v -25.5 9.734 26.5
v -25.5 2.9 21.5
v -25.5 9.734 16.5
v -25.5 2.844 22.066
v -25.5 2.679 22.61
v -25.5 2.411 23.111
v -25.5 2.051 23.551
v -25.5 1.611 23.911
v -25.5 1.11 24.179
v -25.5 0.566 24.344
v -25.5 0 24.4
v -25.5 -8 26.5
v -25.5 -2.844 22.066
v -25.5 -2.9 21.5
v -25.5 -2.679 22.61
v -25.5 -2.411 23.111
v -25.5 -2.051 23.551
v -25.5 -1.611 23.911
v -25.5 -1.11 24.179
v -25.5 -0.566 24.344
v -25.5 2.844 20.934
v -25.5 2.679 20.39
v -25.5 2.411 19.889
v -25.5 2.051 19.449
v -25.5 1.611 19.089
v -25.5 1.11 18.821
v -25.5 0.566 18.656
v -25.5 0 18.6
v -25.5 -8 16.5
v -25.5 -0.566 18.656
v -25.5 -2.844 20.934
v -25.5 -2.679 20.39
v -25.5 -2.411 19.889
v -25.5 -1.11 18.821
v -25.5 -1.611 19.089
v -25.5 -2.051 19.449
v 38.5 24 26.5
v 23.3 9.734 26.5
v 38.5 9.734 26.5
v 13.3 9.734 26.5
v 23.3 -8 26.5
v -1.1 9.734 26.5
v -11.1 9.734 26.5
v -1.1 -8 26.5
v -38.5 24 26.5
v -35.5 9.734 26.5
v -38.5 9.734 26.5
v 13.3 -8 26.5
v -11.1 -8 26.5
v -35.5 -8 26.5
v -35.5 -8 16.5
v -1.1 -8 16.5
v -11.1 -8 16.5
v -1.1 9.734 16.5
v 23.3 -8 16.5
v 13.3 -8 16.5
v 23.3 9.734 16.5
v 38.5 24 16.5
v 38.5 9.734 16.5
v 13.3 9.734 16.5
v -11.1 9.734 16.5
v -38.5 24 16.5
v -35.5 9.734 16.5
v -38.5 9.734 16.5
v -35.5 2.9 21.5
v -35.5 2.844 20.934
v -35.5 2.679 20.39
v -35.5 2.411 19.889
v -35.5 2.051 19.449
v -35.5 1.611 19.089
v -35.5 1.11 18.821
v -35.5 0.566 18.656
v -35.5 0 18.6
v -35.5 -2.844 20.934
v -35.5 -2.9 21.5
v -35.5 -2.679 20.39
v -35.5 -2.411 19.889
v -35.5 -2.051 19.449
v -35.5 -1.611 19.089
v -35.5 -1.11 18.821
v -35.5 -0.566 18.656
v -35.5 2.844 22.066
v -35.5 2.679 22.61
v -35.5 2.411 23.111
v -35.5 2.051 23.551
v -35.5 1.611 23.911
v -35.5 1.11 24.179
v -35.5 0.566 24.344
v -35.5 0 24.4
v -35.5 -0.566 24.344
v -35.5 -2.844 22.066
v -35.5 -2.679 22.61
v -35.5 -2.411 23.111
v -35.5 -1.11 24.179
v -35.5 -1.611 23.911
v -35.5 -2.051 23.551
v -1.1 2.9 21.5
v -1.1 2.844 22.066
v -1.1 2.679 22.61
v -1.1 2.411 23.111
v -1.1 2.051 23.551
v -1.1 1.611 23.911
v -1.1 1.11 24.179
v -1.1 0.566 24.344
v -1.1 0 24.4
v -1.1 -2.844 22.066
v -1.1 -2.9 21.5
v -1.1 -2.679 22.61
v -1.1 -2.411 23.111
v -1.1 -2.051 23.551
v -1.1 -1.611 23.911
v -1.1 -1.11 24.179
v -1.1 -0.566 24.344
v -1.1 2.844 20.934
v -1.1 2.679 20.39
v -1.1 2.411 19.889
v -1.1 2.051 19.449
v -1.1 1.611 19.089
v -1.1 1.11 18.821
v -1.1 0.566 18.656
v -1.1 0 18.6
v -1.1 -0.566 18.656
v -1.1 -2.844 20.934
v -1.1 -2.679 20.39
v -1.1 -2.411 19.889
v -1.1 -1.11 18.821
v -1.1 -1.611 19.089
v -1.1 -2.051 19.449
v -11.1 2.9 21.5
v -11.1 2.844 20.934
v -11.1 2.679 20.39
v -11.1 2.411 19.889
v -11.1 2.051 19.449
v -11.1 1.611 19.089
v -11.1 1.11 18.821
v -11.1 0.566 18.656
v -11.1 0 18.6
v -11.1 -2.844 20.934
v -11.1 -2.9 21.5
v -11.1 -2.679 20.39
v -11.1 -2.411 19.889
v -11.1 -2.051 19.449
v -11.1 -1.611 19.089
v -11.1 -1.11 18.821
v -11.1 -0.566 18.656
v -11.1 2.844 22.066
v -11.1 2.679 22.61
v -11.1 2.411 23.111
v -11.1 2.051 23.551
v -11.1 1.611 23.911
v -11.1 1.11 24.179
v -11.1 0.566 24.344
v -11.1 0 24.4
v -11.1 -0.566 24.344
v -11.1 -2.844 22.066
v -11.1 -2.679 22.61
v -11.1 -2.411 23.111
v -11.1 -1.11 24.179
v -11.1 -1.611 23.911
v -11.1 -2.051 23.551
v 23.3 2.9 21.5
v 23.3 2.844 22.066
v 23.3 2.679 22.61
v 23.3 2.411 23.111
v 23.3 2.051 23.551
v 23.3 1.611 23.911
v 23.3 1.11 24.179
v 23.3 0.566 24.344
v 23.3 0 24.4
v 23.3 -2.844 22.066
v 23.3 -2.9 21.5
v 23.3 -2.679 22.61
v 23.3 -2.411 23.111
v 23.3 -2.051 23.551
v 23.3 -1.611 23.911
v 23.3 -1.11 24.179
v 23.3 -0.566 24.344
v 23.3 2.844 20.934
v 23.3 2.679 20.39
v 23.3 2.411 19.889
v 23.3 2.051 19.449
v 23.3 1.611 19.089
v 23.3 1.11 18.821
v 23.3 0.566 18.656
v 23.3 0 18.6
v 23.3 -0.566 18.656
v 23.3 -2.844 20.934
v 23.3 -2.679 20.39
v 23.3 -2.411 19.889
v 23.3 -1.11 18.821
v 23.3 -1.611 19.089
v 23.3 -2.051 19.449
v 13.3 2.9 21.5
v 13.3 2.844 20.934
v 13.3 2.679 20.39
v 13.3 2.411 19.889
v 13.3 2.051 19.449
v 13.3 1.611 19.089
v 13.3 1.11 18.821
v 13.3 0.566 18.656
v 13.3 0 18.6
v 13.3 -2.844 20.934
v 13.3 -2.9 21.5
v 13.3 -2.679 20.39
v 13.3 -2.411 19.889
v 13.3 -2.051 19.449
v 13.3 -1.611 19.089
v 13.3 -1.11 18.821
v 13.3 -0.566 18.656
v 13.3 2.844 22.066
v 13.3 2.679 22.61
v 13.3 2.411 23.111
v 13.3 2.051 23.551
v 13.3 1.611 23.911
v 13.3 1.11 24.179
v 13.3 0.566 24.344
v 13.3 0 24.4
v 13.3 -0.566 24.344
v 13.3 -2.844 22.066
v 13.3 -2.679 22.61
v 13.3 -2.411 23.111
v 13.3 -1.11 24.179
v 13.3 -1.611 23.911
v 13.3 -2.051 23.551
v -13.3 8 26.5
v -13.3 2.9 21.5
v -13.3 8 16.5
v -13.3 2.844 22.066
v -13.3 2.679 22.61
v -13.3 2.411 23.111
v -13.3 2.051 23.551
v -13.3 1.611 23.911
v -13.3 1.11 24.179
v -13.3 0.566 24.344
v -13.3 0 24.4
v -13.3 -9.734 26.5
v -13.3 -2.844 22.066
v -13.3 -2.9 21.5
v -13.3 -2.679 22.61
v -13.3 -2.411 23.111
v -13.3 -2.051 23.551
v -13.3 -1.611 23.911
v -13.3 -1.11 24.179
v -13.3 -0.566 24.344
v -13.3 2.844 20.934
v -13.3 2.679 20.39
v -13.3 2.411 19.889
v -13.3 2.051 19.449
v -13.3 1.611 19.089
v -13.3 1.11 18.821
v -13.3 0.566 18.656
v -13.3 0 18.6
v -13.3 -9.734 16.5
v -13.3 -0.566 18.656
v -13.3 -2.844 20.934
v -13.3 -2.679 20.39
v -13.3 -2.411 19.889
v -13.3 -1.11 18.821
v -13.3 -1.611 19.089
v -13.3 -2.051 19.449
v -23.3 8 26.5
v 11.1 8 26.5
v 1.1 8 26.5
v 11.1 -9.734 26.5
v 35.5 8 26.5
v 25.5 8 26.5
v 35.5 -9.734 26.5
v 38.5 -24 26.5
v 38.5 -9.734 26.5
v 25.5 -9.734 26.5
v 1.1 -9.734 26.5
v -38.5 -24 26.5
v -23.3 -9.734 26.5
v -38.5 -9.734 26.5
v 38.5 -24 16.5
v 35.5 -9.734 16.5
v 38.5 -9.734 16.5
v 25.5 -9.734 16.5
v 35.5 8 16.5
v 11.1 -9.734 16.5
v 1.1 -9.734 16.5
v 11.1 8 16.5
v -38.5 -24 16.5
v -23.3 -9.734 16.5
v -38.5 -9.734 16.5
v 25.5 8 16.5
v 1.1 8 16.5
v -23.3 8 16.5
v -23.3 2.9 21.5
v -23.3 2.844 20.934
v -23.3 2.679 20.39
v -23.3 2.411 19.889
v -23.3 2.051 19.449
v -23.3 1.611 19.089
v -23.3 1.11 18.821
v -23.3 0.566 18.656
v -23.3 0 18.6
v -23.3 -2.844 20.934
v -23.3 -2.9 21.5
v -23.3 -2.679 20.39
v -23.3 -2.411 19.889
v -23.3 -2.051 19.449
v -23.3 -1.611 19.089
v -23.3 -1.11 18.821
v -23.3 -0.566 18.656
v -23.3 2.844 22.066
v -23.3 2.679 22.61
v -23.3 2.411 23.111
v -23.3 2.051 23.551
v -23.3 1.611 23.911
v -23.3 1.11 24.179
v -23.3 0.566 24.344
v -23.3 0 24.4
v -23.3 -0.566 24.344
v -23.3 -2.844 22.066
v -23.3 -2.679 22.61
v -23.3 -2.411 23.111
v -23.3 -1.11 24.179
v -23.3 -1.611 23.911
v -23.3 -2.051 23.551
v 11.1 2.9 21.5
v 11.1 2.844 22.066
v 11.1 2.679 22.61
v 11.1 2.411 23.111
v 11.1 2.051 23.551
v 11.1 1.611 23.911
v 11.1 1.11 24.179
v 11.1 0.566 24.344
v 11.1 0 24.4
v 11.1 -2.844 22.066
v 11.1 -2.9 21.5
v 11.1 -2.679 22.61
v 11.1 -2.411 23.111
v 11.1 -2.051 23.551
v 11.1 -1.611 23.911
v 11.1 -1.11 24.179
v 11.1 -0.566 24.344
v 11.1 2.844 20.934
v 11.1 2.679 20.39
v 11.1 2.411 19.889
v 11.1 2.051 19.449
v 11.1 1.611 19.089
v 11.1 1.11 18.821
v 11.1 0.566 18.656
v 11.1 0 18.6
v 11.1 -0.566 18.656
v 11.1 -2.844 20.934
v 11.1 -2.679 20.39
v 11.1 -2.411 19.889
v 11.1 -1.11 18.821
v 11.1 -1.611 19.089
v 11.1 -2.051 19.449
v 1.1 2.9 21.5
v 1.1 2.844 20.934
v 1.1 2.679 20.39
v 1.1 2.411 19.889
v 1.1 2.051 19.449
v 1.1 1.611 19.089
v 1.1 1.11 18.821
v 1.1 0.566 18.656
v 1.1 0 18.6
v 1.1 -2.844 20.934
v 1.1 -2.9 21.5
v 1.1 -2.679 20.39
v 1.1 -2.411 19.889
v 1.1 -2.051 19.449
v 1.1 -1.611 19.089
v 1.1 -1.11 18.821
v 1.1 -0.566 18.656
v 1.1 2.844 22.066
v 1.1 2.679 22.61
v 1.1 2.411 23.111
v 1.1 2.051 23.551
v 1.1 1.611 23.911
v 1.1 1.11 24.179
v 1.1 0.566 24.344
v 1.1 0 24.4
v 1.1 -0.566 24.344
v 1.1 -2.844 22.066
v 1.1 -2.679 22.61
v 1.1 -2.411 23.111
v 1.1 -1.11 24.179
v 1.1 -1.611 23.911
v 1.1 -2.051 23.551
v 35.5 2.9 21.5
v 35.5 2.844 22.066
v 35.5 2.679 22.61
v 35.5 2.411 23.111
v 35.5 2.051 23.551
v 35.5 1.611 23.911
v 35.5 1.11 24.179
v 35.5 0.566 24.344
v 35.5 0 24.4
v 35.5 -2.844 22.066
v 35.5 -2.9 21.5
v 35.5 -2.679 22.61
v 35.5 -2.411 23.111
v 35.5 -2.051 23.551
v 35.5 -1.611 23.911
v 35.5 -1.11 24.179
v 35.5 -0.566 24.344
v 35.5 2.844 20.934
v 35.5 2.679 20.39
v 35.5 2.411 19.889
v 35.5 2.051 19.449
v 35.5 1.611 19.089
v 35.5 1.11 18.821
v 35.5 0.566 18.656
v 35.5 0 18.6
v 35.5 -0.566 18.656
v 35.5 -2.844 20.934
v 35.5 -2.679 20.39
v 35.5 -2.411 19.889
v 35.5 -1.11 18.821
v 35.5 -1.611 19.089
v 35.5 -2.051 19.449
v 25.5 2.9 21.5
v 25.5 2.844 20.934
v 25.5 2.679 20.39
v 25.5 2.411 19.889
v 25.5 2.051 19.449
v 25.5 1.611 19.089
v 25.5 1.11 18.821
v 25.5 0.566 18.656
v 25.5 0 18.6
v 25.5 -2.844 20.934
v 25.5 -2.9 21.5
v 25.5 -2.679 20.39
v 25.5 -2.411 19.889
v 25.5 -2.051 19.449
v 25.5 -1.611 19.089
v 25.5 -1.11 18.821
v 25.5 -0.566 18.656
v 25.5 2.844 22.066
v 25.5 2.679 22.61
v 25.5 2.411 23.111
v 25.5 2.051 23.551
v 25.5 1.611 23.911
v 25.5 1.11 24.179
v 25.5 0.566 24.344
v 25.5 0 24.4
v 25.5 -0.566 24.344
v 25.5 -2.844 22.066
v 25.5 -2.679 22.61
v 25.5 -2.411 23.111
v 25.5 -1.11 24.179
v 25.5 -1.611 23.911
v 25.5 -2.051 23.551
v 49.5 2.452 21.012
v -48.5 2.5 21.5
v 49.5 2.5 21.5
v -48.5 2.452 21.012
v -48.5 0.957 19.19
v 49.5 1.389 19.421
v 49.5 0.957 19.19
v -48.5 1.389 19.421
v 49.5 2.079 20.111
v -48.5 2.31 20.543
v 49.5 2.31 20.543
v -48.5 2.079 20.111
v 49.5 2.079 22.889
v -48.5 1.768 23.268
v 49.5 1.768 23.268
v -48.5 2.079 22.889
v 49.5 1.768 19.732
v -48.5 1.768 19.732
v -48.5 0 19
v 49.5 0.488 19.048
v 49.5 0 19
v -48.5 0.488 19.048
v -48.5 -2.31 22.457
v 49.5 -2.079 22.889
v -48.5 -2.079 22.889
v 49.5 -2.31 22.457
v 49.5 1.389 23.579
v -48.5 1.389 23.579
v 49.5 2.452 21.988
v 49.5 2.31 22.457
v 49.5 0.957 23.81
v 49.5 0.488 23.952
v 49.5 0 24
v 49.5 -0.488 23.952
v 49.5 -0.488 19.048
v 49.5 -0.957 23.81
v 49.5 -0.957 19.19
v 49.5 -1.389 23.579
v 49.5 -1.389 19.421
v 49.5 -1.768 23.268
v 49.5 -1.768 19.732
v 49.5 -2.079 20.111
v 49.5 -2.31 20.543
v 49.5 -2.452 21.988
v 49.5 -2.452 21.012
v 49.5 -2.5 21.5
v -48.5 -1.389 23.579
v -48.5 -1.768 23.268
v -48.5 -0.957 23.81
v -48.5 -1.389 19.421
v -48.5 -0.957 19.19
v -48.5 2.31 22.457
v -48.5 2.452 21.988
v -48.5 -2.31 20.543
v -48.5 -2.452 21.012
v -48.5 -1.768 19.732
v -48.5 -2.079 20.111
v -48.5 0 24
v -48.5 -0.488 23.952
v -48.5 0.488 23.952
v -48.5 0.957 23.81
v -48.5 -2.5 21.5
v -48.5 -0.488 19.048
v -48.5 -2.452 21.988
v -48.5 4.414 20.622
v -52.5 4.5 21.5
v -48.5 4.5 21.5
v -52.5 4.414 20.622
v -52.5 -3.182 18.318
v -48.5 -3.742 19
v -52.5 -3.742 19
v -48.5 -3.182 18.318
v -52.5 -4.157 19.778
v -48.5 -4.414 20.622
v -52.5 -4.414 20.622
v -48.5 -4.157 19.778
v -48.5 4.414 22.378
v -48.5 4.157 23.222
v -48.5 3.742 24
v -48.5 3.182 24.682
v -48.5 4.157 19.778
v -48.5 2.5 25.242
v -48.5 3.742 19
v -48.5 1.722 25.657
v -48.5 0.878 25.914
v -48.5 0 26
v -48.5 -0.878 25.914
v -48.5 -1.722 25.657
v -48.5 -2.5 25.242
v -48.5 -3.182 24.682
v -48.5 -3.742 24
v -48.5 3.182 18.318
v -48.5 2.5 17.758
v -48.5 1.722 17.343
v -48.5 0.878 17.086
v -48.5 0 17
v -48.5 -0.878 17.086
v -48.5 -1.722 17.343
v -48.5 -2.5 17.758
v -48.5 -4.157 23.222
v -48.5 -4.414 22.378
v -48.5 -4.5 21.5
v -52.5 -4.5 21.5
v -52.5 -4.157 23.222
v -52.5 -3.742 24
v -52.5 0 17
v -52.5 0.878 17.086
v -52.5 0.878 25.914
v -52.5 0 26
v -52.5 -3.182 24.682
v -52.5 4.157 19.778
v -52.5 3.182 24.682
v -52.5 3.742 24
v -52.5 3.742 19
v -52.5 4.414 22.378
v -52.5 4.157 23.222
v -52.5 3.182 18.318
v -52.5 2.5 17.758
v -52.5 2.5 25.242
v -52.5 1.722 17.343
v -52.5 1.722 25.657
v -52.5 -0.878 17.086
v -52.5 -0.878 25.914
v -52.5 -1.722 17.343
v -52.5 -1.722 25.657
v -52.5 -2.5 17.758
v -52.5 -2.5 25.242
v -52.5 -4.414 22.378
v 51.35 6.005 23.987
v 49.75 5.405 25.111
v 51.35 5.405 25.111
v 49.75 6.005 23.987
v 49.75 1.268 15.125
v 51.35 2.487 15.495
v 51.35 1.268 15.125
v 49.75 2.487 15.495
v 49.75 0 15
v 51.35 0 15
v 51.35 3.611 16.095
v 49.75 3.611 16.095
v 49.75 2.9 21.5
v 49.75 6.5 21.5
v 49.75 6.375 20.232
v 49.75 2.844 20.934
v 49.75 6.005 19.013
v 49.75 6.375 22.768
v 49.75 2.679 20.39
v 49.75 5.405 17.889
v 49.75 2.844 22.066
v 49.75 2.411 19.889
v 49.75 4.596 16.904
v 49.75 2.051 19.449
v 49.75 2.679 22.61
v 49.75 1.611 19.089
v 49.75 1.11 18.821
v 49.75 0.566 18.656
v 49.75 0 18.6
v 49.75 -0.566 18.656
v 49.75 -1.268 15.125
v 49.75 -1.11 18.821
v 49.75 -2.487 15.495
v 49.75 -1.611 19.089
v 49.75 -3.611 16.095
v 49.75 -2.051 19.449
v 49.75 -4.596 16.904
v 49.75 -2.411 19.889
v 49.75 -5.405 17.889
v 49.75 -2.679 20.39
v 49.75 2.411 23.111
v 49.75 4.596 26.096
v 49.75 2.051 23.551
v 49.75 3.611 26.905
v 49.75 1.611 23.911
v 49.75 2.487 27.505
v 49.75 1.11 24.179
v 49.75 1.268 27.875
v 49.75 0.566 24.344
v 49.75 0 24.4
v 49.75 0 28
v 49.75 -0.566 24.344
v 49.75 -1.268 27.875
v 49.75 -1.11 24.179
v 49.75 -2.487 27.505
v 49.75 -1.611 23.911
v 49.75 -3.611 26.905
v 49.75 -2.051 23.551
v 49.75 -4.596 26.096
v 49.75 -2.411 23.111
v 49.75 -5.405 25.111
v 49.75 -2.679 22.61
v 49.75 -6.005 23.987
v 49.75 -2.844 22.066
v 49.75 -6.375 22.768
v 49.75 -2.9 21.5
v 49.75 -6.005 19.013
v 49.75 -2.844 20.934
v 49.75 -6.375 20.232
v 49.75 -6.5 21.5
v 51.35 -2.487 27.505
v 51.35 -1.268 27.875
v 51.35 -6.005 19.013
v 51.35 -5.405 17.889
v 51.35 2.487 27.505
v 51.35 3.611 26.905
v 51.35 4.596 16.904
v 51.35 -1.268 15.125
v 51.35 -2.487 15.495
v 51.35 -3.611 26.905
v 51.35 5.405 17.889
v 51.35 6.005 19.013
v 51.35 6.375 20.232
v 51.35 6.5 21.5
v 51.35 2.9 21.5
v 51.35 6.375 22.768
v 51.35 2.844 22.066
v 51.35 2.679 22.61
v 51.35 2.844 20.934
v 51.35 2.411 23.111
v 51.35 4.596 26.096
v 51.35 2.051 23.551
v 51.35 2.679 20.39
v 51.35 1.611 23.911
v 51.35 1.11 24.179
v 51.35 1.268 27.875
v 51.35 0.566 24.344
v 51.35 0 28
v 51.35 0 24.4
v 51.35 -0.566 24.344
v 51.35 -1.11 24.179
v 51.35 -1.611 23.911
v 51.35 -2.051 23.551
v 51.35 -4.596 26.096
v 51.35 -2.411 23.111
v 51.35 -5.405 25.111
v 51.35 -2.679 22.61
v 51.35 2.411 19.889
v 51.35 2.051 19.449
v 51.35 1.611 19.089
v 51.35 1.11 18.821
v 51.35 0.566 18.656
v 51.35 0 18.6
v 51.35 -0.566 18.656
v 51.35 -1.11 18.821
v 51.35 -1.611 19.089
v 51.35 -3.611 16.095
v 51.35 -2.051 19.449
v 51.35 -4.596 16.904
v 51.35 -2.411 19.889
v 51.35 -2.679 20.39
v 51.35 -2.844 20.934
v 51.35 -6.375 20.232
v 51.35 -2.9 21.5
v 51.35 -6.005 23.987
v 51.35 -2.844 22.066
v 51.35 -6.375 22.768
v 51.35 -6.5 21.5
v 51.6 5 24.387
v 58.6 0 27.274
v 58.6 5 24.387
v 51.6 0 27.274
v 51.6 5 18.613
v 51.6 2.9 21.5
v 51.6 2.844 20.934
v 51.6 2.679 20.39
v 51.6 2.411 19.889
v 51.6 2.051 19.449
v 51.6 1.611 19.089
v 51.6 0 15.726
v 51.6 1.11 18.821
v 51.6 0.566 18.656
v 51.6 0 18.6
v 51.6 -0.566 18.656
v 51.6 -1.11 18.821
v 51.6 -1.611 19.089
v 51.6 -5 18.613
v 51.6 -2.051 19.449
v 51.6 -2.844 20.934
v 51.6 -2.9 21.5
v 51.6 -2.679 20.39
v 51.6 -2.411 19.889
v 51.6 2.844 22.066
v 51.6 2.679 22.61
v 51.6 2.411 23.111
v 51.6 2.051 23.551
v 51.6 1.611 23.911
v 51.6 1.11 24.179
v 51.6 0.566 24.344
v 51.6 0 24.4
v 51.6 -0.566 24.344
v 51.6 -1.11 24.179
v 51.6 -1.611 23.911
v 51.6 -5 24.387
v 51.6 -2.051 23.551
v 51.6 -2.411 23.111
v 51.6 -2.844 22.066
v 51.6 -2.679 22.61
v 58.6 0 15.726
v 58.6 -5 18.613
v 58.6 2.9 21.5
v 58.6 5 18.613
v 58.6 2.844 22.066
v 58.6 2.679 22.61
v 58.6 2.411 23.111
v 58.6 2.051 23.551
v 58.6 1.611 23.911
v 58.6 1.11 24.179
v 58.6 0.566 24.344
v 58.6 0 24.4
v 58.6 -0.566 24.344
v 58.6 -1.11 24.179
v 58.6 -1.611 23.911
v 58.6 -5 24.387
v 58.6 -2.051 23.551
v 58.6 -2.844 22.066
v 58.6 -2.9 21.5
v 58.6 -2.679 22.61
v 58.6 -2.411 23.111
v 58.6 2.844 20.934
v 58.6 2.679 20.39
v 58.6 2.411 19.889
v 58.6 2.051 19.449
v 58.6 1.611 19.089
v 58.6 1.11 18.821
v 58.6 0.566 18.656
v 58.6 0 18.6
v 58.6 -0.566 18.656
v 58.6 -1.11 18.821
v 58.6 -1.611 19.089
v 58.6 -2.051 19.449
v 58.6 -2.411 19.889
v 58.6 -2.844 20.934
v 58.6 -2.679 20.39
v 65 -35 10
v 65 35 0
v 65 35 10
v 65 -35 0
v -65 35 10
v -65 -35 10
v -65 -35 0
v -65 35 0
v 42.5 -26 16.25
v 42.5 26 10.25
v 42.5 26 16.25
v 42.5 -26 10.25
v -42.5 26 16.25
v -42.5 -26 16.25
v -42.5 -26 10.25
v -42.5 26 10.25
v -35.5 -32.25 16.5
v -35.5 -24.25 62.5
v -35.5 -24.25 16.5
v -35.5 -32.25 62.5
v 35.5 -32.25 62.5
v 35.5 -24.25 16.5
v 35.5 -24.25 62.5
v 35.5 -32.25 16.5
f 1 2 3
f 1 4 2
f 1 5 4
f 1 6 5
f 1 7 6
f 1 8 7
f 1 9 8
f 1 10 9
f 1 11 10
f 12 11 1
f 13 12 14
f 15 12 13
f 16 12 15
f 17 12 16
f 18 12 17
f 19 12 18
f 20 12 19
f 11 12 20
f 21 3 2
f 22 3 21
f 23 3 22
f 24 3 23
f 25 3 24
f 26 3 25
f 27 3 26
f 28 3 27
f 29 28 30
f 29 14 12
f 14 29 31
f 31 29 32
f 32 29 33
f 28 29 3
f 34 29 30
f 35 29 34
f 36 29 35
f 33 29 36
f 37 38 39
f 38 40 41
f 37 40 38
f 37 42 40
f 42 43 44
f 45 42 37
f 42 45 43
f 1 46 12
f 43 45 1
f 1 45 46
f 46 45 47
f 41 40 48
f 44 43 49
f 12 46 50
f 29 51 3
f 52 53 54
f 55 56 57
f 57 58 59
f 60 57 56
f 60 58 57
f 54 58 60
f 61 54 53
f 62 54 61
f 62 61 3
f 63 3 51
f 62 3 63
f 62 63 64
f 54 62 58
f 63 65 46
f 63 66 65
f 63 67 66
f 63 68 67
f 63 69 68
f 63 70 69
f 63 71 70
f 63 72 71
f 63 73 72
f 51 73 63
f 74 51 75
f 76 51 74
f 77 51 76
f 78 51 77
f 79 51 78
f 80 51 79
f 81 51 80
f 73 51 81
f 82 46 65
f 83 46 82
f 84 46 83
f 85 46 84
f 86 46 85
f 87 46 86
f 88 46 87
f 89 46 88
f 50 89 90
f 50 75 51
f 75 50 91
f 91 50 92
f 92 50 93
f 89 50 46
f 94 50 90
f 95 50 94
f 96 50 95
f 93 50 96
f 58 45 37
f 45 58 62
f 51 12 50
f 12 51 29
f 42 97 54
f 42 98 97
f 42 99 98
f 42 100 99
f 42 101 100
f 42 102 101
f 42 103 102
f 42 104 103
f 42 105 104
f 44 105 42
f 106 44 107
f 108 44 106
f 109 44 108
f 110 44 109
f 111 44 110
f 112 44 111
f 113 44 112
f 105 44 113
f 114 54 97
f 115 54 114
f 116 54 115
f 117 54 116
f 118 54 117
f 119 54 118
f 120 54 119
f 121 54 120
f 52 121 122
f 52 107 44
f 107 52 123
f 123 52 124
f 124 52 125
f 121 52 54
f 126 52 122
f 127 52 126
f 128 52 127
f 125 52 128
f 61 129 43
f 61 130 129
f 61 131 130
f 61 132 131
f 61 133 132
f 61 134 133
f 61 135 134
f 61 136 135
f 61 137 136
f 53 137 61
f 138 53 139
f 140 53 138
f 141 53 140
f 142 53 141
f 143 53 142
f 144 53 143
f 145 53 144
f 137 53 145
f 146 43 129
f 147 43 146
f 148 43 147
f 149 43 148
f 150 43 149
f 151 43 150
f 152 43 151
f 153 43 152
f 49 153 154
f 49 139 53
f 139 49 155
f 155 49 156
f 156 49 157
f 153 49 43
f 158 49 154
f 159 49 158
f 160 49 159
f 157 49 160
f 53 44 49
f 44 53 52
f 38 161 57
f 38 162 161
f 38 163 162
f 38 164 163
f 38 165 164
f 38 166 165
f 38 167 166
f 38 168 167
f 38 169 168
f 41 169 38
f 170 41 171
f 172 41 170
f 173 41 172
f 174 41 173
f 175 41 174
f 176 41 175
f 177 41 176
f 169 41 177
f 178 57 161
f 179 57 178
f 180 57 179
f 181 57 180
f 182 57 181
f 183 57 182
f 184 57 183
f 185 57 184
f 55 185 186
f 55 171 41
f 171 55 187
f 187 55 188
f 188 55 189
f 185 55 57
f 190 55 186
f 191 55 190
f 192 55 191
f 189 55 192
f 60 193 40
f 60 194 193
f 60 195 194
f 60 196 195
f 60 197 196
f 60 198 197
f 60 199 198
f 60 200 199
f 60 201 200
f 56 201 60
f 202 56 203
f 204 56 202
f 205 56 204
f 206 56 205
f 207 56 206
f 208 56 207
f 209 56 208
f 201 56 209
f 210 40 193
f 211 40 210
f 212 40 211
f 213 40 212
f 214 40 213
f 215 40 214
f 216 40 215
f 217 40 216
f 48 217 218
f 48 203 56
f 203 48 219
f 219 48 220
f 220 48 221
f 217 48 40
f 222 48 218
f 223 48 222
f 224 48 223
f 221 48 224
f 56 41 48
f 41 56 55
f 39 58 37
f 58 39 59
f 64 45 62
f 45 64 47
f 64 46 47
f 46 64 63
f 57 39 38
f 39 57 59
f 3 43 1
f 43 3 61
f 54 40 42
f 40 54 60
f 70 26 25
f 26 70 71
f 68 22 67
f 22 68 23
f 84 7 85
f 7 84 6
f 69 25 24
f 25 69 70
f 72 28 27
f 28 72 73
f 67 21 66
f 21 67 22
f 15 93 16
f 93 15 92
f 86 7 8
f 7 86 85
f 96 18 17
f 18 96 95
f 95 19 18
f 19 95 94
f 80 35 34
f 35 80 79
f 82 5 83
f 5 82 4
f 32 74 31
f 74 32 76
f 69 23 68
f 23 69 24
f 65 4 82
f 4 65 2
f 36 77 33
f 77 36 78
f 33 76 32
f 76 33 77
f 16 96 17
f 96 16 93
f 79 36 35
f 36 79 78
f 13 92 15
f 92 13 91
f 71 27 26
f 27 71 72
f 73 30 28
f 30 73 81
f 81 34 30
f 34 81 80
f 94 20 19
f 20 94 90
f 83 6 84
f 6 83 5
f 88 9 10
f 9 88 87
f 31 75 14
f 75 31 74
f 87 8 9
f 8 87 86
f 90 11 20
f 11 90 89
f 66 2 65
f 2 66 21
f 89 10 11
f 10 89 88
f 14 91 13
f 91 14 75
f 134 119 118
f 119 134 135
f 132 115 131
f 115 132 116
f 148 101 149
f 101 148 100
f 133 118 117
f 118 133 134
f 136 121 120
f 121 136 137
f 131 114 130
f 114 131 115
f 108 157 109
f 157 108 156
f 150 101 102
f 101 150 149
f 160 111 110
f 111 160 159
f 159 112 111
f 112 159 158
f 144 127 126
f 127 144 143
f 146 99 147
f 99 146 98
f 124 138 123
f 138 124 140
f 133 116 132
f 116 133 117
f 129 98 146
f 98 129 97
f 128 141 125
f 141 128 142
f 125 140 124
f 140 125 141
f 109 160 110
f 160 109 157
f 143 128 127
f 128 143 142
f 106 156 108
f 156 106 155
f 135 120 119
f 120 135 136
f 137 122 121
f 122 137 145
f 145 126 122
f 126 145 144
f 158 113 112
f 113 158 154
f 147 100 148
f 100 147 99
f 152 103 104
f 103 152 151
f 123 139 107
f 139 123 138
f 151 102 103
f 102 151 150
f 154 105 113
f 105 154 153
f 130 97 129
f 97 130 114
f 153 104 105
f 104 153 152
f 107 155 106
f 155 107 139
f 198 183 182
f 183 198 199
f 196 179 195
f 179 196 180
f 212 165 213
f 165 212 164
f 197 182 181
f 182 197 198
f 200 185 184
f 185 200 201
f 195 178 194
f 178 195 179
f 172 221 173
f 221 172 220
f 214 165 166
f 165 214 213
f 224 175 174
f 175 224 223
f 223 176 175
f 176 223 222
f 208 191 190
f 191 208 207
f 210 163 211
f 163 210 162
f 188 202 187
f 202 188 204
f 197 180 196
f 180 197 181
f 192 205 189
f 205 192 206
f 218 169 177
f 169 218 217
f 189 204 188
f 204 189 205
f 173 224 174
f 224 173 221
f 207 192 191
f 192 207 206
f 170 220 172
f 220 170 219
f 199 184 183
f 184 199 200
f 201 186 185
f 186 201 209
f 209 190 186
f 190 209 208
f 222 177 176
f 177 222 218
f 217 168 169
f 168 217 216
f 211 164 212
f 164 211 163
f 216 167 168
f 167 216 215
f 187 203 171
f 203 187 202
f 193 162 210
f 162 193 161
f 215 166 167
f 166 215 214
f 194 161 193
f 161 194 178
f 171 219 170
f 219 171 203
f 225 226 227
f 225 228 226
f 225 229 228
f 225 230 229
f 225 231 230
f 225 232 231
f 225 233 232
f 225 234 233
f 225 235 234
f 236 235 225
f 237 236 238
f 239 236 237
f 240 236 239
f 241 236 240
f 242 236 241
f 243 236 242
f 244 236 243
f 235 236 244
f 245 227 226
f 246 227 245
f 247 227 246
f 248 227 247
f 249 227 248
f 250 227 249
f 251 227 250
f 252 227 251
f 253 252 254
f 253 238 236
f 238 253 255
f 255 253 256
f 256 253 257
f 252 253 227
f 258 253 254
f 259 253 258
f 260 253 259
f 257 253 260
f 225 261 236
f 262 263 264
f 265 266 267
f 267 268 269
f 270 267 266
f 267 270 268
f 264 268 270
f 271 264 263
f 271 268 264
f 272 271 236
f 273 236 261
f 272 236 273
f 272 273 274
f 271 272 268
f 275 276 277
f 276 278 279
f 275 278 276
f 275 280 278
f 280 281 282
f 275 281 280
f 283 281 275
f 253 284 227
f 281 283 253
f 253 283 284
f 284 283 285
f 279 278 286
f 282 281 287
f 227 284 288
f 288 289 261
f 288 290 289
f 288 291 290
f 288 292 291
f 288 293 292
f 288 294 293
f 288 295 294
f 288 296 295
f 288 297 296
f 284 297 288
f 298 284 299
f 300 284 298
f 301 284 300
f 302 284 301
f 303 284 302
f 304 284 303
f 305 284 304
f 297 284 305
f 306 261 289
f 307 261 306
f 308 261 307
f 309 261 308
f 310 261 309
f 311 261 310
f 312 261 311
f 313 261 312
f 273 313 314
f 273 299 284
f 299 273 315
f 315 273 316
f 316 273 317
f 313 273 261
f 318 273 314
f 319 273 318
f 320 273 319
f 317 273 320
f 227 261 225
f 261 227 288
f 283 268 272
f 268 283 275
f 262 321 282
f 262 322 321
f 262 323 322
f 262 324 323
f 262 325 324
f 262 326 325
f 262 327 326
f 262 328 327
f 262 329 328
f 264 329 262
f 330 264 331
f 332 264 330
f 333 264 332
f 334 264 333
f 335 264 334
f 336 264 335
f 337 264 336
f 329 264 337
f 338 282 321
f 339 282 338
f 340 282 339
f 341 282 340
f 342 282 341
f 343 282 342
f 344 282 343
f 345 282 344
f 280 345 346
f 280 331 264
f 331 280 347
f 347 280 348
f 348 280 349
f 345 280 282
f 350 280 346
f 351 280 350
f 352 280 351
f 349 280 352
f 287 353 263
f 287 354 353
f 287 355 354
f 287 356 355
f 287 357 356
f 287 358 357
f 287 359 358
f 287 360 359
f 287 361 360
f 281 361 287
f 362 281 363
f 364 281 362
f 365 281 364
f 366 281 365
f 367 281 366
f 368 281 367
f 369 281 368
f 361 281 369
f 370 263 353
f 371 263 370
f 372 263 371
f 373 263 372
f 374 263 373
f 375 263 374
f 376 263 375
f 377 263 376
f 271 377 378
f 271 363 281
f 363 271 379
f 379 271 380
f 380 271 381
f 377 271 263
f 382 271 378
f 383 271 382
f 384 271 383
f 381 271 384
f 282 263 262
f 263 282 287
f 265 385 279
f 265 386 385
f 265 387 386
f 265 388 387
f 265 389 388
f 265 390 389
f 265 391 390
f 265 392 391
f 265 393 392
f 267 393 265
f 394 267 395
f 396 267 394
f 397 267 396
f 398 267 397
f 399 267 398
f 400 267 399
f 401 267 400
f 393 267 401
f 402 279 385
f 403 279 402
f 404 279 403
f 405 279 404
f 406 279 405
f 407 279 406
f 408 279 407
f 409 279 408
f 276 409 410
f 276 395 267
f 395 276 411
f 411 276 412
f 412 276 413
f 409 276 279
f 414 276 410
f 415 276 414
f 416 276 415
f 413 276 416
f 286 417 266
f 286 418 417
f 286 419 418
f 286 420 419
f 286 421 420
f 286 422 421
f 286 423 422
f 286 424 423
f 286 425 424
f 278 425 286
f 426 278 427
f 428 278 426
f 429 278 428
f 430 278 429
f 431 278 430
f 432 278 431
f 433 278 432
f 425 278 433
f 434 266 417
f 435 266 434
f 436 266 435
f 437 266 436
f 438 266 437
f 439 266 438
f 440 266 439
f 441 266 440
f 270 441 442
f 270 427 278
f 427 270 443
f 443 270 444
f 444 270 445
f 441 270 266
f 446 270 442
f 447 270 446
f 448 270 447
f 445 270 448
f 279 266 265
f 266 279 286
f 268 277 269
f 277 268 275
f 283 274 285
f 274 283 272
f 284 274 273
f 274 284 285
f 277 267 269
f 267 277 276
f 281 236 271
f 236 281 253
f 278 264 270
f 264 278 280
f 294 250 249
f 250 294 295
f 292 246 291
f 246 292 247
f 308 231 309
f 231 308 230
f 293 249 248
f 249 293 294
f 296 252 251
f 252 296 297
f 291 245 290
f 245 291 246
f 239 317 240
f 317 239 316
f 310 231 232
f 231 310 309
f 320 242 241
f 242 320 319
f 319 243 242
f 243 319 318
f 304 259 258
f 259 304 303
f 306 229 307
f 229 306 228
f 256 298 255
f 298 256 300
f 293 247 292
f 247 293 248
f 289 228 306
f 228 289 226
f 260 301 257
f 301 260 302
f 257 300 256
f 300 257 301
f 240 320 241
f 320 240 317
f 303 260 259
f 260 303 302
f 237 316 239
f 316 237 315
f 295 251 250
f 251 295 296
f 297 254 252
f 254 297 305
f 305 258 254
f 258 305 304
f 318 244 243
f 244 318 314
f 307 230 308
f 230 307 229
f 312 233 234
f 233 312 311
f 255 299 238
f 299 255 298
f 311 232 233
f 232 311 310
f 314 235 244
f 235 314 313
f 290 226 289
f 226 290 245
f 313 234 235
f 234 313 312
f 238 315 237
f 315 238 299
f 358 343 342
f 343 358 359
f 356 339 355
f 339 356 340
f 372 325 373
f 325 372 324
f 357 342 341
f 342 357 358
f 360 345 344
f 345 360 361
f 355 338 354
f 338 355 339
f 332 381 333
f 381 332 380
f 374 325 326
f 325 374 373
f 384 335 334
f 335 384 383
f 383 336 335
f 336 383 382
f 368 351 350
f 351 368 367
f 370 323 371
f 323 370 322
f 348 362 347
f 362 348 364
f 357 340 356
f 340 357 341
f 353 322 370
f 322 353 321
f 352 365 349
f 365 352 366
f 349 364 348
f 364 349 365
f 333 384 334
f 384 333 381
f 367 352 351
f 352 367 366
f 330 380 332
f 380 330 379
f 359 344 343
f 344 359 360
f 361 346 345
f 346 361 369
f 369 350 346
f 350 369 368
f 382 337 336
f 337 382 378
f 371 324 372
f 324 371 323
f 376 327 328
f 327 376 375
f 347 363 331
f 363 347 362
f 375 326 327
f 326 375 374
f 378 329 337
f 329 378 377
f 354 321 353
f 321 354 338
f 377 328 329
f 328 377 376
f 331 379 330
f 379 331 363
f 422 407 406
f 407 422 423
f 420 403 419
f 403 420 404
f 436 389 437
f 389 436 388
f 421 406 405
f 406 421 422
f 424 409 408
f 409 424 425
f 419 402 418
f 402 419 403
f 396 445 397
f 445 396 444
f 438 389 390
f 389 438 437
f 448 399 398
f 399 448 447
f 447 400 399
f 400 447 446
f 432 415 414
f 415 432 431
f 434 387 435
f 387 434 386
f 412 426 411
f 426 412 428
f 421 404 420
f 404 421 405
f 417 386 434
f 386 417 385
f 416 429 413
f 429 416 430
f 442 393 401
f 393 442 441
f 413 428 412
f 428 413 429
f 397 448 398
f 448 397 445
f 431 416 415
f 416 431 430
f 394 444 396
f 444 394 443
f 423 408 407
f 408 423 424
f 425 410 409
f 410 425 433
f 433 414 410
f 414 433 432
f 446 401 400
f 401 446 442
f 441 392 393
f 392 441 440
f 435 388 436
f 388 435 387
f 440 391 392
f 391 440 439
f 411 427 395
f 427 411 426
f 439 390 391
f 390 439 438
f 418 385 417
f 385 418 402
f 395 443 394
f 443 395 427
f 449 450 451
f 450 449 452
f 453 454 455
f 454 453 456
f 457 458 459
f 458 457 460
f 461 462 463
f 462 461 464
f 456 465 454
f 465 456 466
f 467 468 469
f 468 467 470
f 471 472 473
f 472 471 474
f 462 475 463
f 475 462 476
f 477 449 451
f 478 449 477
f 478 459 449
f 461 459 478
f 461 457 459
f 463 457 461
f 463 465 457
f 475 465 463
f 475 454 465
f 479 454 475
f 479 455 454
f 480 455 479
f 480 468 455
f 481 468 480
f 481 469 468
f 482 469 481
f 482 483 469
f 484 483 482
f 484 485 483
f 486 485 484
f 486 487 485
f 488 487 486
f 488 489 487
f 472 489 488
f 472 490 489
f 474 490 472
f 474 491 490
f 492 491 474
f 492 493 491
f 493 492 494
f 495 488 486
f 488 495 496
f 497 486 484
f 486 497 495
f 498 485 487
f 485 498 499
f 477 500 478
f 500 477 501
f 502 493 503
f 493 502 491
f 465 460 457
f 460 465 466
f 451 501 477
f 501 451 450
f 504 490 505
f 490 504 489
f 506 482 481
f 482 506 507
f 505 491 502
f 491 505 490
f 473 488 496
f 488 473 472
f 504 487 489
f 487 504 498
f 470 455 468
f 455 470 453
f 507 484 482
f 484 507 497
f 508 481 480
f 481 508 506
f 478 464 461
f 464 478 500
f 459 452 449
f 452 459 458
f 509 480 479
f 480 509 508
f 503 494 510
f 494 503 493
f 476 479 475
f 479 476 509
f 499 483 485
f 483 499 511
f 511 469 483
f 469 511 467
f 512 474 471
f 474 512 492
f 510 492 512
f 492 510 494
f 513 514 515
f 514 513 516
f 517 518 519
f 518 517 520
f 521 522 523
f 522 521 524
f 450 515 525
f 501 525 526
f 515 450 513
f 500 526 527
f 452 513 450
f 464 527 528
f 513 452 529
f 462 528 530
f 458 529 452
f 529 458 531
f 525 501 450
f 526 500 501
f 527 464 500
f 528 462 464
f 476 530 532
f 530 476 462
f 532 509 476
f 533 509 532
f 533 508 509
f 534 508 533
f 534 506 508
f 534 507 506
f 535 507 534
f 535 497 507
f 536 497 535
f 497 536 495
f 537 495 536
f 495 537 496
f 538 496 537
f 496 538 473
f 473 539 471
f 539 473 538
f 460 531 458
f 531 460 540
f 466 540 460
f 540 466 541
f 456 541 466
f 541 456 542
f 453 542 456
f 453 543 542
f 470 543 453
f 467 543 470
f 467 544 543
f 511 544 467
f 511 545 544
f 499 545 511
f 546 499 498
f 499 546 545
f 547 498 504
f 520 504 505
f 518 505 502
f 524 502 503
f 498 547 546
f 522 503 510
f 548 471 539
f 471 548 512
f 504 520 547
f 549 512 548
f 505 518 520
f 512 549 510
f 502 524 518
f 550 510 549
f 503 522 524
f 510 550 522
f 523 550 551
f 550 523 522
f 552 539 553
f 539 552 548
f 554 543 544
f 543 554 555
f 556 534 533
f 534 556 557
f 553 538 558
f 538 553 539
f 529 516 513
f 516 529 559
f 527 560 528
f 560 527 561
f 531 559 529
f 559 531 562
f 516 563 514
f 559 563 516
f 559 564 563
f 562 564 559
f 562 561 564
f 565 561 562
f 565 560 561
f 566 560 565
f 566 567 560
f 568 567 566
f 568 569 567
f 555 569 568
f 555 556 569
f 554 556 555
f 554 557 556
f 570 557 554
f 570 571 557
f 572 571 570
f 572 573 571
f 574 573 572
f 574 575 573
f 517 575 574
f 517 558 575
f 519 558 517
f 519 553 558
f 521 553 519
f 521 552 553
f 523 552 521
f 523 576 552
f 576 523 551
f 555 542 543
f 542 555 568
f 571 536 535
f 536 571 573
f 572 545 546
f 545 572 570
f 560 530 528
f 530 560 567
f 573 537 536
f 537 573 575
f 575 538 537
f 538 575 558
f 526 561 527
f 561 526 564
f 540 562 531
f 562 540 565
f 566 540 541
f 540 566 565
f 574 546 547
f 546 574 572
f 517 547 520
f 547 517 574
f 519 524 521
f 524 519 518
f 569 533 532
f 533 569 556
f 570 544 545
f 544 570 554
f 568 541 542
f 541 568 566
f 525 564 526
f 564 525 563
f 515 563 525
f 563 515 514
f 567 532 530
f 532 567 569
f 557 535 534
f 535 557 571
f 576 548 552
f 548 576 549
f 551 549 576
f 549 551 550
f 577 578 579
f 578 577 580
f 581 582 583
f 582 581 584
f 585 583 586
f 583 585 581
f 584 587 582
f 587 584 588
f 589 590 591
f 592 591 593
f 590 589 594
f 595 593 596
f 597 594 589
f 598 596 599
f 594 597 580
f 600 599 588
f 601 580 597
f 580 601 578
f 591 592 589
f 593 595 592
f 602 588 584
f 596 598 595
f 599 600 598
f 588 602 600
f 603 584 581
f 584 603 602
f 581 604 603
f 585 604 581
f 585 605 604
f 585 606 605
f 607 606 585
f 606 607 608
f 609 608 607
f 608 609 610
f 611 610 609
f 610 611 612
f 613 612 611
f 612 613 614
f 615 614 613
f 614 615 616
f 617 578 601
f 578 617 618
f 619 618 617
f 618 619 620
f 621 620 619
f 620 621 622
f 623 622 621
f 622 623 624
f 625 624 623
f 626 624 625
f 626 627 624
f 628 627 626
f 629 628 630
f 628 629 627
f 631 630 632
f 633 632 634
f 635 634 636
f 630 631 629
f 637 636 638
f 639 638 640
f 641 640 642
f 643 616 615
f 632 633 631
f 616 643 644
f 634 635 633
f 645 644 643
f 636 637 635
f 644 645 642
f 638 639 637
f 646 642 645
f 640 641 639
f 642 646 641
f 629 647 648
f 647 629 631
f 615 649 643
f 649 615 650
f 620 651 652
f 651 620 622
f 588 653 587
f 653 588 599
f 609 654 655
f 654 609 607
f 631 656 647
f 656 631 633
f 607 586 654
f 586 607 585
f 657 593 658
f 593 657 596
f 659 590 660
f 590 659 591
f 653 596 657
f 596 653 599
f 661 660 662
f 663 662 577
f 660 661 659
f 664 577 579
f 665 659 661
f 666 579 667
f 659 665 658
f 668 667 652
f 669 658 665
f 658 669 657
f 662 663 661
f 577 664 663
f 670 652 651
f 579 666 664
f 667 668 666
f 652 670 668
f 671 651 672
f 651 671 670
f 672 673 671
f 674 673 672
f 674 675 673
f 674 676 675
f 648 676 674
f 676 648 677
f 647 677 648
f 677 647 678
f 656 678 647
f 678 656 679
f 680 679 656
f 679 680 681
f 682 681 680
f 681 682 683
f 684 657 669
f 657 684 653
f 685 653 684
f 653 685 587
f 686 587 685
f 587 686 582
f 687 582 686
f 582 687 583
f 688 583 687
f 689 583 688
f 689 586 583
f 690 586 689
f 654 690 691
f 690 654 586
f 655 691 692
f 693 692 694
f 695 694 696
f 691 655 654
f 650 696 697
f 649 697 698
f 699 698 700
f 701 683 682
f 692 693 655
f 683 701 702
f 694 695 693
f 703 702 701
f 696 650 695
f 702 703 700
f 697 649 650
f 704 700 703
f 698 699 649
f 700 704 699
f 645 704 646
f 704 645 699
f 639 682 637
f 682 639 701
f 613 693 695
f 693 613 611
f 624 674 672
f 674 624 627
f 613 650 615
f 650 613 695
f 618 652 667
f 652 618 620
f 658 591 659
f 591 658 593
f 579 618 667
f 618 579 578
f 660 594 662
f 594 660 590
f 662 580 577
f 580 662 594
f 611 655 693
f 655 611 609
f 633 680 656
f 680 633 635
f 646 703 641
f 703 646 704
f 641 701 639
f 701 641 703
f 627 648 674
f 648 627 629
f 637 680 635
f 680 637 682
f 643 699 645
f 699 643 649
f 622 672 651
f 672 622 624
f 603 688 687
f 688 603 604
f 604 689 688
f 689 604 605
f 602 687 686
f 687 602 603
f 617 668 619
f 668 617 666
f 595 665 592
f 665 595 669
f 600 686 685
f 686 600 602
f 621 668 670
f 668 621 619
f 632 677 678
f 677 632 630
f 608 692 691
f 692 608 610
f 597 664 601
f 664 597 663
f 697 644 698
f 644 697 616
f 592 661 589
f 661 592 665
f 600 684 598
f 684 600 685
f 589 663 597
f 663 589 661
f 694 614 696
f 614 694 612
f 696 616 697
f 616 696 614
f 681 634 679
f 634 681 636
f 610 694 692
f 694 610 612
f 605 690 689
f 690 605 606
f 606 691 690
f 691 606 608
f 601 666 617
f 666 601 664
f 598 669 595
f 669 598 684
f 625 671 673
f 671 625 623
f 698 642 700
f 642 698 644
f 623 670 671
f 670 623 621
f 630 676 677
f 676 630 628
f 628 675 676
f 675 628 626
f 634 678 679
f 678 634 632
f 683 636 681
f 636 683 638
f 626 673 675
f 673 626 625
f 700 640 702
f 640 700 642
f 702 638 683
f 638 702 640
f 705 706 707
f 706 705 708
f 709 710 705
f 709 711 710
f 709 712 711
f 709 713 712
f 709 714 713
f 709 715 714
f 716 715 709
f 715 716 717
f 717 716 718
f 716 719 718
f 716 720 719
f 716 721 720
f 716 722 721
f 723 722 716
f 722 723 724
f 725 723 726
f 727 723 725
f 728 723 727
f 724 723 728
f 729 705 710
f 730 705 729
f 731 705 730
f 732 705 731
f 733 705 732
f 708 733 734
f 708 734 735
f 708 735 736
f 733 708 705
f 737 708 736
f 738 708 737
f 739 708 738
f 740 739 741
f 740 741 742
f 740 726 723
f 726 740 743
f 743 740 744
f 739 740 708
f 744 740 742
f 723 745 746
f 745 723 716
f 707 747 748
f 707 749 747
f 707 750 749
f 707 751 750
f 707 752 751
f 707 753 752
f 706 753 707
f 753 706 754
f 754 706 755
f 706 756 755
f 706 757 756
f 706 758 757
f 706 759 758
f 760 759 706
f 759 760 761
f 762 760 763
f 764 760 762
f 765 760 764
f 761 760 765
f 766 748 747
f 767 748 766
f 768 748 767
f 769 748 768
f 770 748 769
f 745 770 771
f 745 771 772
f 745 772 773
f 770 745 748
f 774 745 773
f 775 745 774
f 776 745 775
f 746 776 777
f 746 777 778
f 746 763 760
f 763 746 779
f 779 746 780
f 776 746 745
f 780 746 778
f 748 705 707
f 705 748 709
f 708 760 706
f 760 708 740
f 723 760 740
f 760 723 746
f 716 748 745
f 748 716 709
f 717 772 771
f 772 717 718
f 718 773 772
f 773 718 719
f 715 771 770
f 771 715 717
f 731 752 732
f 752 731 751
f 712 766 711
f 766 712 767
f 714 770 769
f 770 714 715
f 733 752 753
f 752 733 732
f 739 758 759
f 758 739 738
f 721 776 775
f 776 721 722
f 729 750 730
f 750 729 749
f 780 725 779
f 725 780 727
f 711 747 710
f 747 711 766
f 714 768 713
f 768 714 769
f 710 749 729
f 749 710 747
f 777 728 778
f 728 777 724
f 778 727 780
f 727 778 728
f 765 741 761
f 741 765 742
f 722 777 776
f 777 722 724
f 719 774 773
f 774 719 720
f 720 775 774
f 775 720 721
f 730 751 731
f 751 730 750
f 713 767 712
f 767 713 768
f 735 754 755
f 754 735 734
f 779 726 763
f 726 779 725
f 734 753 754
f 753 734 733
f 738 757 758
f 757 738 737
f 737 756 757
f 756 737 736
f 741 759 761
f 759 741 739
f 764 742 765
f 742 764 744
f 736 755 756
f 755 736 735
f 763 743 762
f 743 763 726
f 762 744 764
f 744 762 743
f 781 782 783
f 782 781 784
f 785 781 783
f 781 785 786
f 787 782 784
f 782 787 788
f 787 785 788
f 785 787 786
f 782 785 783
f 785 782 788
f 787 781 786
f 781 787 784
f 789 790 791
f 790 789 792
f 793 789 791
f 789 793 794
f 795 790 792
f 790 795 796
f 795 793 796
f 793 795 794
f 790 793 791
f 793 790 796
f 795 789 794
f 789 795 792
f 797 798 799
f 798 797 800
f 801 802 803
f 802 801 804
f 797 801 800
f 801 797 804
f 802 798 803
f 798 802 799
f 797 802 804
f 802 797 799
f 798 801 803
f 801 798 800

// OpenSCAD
$fn = 32;

// ------------------------------------------------------------------------
// Comb hinge with flap: leaf 77 x 24 mm, pin d5, flap 46 mm
// Every part is its own module, assembly() places every instance.
// ------------------------------------------------------------------------

// --- part 1 ---
module hinge_bed() {
  difference() {
    translate([-65, -35, 0]) cube([130, 70, 10]);
  }
}

// --- part 2 ---
module hinge_riser() {
  difference() {
    translate([-42.5, -26, 0]) cube([85, 52, 6]);
  }
}

// --- part 3 ---
module hinge_leaf_a() {
  difference() {
    union() {
      translate([-35.5, -8, -5]) cube([10, 32, 10]);
      translate([-11.1, -8, -5]) cube([10, 32, 10]);
      translate([13.3, -8, -5]) cube([10, 32, 10]);
      translate([-38.5, 9.734, -5]) cube([77, 14.266, 10]);
    }
    translate([-30.5, 0, 0]) rotate([0, 90, 0]) cylinder(h = 12, d = 5.8, center = true);
    translate([-6.1, 0, 0]) rotate([0, 90, 0]) cylinder(h = 12, d = 5.8, center = true);
    translate([18.3, 0, 0]) rotate([0, 90, 0]) cylinder(h = 12, d = 5.8, center = true);
  }
}

// --- part 4 ---
module hinge_leaf_b() {
  difference() {
    union() {
      translate([-23.3, -24, -5]) cube([10, 32, 10]);
      translate([1.1, -24, -5]) cube([10, 32, 10]);
      translate([25.5, -24, -5]) cube([10, 32, 10]);
      translate([-38.5, -24, -5]) cube([77, 14.266, 10]);
    }
    translate([-18.3, 0, 0]) rotate([0, 90, 0]) cylinder(h = 12, d = 5.8, center = true);
    translate([6.1, 0, 0]) rotate([0, 90, 0]) cylinder(h = 12, d = 5.8, center = true);
    translate([30.5, 0, 0]) rotate([0, 90, 0]) cylinder(h = 12, d = 5.8, center = true);
  }
}

// --- part 5 ---
module hinge_flap() {
  difference() {
    translate([-35.5, -23, 0]) cube([71, 46, 8]);
  }
}

// --- part 6 ---
module hinge_pin() {
  rotate([0, 90, 0]) cylinder(h = 99, d = 5, center = true);
  translate([-52.5, 0, 0]) rotate([0, 90, 0]) cylinder(h = 4, d = 9);
}

// --- part 7 ---
module pin_washer() {
  difference() {
      translate([0, 0, 0]) cylinder(h = 1.6, d = 13);
      translate([0, 0, -1]) cylinder(h = 3.6, d = 5.8);
    }
}

// --- part 8 ---
module pin_nut() {
  difference() {
    linear_extrude(height = 7) polygon(points = [[5.774, 0], [2.887, 5], [-2.887, 5], [-5.774, 0], [-2.887, -5], [2.887, -5]]);
    translate([0, 0, -1]) cylinder(h = 9, d = 5.8);
  }
}

// --- assembly ---
module assembly() {
  color([0.80, 0.24, 0.20]) translate([0, 0, 0]) rotate([0, 0, 0]) hinge_bed();
  color([0.20, 0.45, 0.75]) translate([0, 0, 10.25]) rotate([0, 0, 0]) hinge_riser();
  color([0.25, 0.62, 0.32]) translate([0, 0, 21.5]) rotate([0, 0, 0]) hinge_leaf_a();
  color([0.92, 0.70, 0.18]) translate([0, 0, 21.5]) rotate([0, 0, 0]) hinge_leaf_b();
  color([0.58, 0.35, 0.70]) translate([0, -24.25, 39.5]) rotate([90, 0, 0]) hinge_flap();
  color([0.16, 0.66, 0.66]) translate([0, 0, 21.5]) rotate([0, 0, 0]) hinge_pin();
  color([0.85, 0.48, 0.18]) translate([49.75, 0, 21.5]) rotate([0, 90, 0]) pin_washer();
  color([0.55, 0.60, 0.65]) translate([51.6, 0, 21.5]) rotate([0, 90, 0]) pin_nut();
}

assembly();
